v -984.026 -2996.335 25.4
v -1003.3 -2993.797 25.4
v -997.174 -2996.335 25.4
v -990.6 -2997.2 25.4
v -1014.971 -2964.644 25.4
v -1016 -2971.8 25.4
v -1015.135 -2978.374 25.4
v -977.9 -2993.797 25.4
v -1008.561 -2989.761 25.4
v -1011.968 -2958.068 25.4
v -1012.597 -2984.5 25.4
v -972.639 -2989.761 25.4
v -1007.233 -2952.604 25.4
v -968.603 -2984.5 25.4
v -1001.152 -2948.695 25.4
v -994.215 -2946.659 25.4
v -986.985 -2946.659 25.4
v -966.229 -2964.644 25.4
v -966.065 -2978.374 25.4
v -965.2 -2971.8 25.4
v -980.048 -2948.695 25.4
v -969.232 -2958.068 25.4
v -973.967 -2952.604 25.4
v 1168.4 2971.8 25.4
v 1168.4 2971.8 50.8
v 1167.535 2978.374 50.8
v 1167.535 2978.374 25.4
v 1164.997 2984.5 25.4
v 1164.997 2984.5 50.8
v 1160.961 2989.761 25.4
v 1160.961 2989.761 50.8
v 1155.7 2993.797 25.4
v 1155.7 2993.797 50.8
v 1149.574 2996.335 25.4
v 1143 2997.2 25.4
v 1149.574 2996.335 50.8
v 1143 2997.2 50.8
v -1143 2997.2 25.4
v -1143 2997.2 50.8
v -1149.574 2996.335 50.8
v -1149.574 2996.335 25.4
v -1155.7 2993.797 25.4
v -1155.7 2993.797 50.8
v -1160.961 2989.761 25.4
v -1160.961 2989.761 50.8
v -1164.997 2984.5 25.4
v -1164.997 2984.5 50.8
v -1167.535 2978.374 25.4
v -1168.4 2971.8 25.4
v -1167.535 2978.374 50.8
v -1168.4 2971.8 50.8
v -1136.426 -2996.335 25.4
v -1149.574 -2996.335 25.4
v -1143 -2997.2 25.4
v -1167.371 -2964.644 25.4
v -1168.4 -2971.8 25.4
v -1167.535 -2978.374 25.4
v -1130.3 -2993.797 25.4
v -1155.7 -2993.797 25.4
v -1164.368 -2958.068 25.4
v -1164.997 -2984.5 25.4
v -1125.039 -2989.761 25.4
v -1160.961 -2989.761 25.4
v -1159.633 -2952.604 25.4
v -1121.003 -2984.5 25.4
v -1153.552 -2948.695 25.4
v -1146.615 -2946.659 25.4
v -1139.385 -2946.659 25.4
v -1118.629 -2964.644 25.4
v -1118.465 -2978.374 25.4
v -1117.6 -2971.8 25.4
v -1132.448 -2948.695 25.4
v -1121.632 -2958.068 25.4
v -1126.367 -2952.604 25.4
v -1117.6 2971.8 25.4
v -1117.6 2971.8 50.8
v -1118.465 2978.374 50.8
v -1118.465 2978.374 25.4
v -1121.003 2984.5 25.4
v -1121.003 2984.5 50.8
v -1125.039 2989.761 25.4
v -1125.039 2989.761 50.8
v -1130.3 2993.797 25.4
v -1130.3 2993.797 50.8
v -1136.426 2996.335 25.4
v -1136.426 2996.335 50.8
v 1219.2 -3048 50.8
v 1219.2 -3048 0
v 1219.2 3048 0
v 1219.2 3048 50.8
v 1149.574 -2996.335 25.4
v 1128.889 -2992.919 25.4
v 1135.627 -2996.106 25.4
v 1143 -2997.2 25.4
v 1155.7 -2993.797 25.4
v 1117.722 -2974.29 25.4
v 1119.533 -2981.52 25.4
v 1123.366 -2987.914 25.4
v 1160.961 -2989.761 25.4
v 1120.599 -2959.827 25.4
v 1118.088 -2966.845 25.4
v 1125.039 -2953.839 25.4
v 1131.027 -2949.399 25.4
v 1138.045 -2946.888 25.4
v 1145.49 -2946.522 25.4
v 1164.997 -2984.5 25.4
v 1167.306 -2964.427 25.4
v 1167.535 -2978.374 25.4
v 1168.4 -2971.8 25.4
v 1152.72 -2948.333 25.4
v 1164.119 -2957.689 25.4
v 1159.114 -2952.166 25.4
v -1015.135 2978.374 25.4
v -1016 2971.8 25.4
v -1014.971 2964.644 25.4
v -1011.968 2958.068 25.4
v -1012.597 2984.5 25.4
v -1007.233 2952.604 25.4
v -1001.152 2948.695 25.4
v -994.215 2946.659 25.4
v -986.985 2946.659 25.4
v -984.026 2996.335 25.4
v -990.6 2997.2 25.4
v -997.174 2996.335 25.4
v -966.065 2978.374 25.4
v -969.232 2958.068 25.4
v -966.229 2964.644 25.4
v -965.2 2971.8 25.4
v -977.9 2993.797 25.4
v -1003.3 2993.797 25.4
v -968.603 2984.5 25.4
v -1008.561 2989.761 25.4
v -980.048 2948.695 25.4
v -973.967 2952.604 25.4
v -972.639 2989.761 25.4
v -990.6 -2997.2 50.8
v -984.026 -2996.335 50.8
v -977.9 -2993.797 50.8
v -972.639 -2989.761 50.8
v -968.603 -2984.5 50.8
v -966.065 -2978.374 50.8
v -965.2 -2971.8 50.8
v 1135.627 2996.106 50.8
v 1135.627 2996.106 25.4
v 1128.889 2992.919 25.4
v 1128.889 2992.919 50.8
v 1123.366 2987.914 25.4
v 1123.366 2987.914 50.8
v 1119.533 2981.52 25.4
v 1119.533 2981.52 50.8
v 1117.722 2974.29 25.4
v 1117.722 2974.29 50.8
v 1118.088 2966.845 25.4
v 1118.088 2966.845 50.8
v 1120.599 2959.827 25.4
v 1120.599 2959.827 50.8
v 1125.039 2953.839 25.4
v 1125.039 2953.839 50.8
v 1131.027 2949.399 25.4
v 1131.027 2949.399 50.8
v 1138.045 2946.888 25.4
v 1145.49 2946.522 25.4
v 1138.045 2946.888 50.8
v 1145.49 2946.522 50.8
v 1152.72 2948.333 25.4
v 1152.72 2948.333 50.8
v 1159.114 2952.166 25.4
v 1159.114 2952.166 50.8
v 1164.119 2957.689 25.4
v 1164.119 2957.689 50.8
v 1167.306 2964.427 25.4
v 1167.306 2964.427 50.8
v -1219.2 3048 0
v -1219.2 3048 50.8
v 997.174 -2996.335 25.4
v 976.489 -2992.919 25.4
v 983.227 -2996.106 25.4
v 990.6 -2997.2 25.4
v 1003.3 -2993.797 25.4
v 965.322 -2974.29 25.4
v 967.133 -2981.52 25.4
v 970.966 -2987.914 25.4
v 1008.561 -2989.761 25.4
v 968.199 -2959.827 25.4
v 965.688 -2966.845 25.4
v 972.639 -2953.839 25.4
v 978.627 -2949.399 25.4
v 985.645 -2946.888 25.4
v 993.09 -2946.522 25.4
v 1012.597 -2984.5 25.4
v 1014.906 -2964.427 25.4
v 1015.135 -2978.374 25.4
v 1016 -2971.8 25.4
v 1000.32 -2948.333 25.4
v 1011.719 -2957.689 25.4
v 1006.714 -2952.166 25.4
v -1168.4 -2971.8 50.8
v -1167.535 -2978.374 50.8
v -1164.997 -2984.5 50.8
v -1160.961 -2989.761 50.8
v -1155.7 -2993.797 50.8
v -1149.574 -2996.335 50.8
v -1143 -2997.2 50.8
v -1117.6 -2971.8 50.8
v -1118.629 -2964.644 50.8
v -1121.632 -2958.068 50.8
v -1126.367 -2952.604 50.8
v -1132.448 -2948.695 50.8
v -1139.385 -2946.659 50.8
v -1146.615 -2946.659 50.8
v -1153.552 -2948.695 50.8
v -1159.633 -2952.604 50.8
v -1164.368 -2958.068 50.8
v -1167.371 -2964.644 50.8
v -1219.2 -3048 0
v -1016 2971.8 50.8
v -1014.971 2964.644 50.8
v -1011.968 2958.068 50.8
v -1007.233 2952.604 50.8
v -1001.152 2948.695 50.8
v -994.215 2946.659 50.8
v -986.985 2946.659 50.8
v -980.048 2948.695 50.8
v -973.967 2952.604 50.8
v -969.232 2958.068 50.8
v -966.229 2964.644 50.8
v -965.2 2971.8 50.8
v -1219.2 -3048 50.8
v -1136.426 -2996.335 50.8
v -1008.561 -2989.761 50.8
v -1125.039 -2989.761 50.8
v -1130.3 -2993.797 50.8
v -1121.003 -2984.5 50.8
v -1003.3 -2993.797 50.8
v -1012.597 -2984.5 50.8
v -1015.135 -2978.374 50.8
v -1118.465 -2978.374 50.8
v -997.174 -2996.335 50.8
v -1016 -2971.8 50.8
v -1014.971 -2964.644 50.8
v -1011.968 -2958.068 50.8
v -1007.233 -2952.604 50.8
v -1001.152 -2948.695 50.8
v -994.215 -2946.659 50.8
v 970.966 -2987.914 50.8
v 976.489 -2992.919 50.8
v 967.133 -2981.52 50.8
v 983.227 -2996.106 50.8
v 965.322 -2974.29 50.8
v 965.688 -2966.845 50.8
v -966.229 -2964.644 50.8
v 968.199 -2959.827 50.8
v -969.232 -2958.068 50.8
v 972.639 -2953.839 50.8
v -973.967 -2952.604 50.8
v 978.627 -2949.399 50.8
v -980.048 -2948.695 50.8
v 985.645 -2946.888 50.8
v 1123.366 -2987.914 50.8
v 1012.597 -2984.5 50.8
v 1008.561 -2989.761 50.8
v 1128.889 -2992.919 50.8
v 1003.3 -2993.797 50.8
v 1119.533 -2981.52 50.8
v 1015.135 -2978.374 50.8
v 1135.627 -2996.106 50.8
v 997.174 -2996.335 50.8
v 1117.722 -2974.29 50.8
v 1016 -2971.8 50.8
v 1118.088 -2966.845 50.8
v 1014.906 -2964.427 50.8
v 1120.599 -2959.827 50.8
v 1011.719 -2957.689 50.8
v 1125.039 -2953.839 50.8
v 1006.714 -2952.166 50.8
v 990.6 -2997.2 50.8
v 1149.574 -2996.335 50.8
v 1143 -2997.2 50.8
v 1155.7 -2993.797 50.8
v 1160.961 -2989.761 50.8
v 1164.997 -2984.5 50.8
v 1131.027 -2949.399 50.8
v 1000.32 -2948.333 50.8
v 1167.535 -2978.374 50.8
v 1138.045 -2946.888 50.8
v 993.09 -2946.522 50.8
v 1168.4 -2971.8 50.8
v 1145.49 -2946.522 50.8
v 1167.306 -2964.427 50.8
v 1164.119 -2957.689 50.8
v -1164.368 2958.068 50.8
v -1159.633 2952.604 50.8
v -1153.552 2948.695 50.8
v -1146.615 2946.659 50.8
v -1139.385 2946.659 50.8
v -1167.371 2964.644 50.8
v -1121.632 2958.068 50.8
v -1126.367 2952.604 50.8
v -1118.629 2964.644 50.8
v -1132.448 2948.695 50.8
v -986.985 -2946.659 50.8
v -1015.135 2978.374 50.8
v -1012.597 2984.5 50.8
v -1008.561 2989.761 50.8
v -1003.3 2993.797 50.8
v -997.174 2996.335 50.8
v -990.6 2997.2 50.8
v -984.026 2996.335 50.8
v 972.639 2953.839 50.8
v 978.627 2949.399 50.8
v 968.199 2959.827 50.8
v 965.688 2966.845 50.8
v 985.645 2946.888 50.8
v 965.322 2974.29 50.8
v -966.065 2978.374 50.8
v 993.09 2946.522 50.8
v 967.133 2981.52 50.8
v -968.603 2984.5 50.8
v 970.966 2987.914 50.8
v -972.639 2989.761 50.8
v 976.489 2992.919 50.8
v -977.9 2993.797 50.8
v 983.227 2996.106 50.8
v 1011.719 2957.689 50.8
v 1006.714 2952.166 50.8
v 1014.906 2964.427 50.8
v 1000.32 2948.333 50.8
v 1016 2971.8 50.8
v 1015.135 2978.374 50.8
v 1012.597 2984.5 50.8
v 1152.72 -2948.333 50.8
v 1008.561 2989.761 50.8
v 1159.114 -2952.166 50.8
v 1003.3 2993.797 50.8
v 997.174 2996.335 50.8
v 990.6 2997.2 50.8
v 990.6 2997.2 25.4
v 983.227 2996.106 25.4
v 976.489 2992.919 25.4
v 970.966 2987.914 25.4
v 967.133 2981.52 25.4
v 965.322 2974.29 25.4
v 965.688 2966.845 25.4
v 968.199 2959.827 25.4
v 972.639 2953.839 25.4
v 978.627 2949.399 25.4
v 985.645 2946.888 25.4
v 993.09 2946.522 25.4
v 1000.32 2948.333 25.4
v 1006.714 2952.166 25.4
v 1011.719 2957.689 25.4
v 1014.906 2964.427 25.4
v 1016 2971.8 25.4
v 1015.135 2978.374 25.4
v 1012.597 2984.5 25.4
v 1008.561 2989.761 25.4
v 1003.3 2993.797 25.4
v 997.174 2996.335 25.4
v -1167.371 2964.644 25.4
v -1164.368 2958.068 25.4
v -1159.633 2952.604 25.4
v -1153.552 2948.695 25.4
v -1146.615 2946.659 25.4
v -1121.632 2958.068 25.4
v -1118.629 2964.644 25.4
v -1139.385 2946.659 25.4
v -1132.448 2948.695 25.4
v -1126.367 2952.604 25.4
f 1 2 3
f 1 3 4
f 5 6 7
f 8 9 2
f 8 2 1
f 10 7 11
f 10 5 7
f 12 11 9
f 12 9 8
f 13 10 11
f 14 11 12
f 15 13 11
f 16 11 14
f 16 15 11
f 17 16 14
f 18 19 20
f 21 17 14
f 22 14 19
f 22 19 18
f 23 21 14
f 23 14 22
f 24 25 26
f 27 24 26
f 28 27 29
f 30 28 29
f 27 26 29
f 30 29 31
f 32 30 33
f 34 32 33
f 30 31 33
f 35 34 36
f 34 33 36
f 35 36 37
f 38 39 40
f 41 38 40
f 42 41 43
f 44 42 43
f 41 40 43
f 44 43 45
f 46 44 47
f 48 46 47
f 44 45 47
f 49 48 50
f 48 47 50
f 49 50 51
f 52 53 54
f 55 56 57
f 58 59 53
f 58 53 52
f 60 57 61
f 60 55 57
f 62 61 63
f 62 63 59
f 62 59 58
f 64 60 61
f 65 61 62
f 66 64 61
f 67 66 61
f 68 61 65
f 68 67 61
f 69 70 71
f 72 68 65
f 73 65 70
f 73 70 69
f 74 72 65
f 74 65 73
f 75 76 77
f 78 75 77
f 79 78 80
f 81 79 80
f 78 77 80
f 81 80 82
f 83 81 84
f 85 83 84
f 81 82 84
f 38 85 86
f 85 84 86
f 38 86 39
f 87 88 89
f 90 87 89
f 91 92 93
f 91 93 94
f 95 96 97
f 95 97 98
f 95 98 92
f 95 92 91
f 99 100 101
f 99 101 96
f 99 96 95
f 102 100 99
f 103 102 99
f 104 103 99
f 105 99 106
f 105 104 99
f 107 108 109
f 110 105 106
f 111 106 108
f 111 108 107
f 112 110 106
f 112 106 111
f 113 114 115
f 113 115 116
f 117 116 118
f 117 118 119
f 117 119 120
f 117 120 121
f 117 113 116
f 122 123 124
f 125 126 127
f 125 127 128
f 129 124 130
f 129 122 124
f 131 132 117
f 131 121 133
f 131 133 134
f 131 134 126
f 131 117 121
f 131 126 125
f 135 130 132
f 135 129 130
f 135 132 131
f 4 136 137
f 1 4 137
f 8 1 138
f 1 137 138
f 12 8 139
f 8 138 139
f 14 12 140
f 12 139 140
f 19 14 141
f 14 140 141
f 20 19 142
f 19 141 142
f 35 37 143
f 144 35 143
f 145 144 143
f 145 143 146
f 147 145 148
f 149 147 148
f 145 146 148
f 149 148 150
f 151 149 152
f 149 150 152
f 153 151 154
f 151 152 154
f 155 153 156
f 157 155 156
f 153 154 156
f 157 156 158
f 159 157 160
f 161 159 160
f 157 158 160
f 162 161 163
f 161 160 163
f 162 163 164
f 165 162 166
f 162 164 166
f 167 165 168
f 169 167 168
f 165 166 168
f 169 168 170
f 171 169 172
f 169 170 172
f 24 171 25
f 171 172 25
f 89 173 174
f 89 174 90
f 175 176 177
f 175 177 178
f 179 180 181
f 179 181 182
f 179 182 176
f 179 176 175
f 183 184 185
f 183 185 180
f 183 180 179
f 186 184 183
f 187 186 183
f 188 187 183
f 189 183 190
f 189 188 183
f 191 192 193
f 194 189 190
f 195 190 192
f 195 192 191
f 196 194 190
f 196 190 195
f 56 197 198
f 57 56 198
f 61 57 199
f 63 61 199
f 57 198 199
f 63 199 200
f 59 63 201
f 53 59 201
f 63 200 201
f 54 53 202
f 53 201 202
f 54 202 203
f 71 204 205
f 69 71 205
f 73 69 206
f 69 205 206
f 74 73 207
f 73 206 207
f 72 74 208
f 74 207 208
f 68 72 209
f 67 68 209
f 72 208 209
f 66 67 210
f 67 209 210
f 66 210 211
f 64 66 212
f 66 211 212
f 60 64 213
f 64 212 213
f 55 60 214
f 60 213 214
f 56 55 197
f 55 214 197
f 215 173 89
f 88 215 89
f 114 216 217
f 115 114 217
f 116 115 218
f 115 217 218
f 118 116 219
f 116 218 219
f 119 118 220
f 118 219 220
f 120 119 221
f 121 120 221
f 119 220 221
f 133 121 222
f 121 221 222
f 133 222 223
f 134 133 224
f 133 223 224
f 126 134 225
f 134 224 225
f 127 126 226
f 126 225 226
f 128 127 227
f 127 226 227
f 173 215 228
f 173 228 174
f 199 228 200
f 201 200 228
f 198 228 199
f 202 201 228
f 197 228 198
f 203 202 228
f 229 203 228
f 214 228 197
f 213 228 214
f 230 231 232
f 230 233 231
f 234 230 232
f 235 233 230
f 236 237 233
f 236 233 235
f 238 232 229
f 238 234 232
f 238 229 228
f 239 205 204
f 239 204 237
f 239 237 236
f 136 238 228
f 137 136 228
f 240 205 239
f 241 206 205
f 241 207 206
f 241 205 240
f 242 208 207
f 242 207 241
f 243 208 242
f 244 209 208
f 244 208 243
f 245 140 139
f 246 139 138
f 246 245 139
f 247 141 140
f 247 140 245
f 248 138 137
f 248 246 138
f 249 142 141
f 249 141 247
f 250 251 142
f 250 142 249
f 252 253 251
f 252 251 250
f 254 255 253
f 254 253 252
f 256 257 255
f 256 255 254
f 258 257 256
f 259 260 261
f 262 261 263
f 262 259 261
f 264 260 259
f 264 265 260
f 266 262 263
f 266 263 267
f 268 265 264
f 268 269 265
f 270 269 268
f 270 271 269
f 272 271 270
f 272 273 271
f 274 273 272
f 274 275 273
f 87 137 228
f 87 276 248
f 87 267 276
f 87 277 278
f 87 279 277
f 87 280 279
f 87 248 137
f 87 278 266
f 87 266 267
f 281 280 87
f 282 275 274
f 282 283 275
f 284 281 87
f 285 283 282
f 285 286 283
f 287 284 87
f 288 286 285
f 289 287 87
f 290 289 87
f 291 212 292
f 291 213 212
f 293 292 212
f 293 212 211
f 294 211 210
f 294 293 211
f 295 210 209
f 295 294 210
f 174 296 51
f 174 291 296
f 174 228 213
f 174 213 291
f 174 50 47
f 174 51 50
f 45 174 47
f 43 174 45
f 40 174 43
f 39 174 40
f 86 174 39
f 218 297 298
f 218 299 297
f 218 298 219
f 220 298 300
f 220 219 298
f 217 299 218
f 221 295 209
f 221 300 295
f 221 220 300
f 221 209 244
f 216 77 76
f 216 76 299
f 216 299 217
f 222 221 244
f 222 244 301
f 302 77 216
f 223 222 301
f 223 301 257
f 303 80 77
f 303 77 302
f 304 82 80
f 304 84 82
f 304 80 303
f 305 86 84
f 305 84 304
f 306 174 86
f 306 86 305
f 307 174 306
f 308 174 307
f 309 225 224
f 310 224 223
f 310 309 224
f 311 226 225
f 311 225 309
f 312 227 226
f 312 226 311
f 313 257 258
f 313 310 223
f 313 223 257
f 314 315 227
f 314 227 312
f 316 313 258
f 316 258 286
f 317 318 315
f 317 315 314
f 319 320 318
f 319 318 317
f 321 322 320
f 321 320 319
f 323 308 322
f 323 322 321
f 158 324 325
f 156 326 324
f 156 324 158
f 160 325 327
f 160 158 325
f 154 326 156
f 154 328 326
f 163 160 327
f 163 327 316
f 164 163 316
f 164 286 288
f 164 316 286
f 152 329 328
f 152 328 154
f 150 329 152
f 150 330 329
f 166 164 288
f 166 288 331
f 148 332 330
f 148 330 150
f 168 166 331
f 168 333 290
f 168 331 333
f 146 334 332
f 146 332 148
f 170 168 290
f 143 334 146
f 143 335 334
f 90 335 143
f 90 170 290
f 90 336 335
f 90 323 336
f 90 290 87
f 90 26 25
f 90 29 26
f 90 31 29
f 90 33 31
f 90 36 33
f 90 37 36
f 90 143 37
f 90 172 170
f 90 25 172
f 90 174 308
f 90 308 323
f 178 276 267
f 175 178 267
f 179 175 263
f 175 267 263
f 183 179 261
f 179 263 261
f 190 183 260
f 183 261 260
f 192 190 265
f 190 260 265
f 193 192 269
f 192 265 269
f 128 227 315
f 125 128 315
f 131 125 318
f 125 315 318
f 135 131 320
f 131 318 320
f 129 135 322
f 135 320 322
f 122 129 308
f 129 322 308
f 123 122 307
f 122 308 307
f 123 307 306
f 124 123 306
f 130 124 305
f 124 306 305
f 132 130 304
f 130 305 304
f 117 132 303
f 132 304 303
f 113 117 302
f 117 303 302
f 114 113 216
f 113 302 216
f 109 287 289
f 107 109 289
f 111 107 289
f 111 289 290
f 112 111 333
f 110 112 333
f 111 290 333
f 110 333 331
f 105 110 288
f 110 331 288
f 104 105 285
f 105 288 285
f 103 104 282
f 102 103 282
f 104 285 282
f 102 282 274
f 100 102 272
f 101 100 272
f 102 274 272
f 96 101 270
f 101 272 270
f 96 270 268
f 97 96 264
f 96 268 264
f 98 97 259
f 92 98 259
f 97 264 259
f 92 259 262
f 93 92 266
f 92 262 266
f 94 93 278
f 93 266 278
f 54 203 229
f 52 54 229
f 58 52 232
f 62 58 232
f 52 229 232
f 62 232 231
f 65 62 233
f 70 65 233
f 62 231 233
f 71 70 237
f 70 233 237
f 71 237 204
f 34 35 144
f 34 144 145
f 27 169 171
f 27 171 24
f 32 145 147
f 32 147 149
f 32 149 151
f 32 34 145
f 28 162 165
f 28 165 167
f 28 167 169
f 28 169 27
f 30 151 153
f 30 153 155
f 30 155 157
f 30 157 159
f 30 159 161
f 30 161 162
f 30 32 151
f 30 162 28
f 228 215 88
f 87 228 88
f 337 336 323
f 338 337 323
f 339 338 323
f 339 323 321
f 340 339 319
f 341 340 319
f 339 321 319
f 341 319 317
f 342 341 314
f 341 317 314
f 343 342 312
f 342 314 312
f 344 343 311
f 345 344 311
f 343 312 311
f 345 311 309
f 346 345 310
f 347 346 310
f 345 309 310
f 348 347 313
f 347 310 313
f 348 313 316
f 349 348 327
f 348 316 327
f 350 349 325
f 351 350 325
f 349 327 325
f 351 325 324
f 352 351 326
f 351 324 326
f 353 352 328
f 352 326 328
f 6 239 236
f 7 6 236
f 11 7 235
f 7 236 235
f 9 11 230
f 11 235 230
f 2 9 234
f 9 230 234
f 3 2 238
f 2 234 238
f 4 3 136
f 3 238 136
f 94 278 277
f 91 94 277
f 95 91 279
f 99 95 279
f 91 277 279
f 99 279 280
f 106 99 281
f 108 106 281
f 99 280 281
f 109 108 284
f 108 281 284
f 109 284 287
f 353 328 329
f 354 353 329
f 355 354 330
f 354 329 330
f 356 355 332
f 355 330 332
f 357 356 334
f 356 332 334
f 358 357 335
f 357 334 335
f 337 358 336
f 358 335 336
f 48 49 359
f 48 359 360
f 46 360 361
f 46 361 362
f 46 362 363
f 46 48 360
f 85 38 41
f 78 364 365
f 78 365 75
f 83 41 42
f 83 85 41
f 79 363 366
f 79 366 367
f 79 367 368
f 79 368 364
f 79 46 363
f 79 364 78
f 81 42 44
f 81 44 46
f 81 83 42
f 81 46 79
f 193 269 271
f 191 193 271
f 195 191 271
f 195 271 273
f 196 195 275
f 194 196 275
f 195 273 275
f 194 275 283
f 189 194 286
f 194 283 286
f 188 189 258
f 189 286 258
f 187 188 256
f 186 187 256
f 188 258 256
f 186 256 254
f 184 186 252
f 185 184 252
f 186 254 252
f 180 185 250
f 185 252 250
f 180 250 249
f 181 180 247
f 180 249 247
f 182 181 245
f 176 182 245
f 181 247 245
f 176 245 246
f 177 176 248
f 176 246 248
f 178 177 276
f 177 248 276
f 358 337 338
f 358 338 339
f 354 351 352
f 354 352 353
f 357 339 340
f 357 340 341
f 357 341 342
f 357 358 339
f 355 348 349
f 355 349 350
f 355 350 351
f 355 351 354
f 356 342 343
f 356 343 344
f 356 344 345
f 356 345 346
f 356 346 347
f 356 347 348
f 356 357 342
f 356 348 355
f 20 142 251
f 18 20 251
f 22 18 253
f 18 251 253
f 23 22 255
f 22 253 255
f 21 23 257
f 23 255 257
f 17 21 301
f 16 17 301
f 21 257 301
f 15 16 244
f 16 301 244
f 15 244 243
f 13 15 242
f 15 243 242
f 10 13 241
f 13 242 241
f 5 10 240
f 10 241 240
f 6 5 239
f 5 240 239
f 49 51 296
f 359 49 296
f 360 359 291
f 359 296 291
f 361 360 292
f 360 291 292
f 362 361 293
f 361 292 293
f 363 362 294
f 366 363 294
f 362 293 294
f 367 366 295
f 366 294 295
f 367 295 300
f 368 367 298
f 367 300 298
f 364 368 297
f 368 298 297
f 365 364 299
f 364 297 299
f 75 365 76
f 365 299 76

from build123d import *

# Parameters (mm, degrees)
F0_W     = 2438.4
F0_H     = 6096
F1_DEPTH = 50.8
F3_DEPTH = 25.4
F5_DEPTH = 25.4


with BuildPart() as f1:
    # F0 (on Top) → F1 (new body)
    with BuildSketch(Plane.XY):
        Rectangle(F0_W, F0_H)
    extrude(amount=F1_DEPTH)

    # F2 (on face) → F3 (cut)
    with BuildSketch(Plane.XY.offset(50.8)):
        with BuildLine():
            Line((1143, 2971.8), (1168.4, 2971.8))
            ThreePointArc((1168.4, 2971.8), (1160.960512, 2989.760512), (1143, 2997.2))
            Line((1143, 2997.2), (1143, 2971.8))
        make_face()
        with BuildLine():
            ThreePointArc((1143, 2997.2), (1125.039488, 2953.839488), (1168.4, 2971.8))
            Line((1168.4, 2971.8), (1143, 2971.8))
            Line((1143, 2971.8), (1143, 2997.2))
        make_face()
        with BuildLine():
            Line((1143, -2971.8), (1143, -2997.2))
            ThreePointArc((1143, -2997.2), (1160.960512, -2989.760512), (1168.4, -2971.8))
            Line((1168.4, -2971.8), (1143, -2971.8))
        make_face()
        with BuildLine():
            ThreePointArc((1168.4, -2971.8), (1125.039488, -2953.839488), (1143, -2997.2))
            Line((1143, -2997.2), (1143, -2971.8))
            Line((1143, -2971.8), (1168.4, -2971.8))
        make_face()
        with BuildLine():
            ThreePointArc((-1168.4, -2971.8), (-1160.960512, -2989.760512), (-1143, -2997.2))
            Line((-1143, -2997.2), (-1143, -2971.8))
            Line((-1143, -2971.8), (-1168.4, -2971.8))
        make_face()
        with BuildLine():
            Line((-1143, -2971.8), (-1143, -2997.2))
            ThreePointArc((-1143, -2997.2), (-1125.039488, -2989.760512), (-1117.6, -2971.8))
            ThreePointArc((-1117.6, -2971.8), (-1143, -2946.4), (-1168.4, -2971.8))
            Line((-1168.4, -2971.8), (-1143, -2971.8))
        make_face()
        with BuildLine():
            ThreePointArc((-1143, 2997.2), (-1160.960512, 2989.760512), (-1168.4, 2971.8))
            Line((-1168.4, 2971.8), (-1143, 2971.8))
            Line((-1143, 2971.8), (-1143, 2997.2))
        make_face()
        with BuildLine():
            Line((-1143, 2971.8), (-1168.4, 2971.8))
            ThreePointArc((-1168.4, 2971.8), (-1143, 2946.4), (-1117.6, 2971.8))
            ThreePointArc((-1117.6, 2971.8), (-1125.039488, 2989.760512), (-1143, 2997.2))
            Line((-1143, 2997.2), (-1143, 2971.8))
        make_face()
    extrude(amount=-F3_DEPTH, mode=Mode.SUBTRACT)

    # F4 (on face) → F5 (cut)
    with BuildSketch(Plane.XY.offset(50.8)):
        with BuildLine():
            ThreePointArc((1016, -2971.8), (972.639488, -2953.839488), (990.6, -2997.2))
            Line((990.6, -2997.2), (990.6, -2971.8))
            Line((990.6, -2971.8), (1016, -2971.8))
        make_face()
        with BuildLine():
            Line((990.6, -2971.8), (990.6, -2997.2))
            ThreePointArc((990.6, -2997.2), (1008.560512, -2989.760512), (1016, -2971.8))
            Line((1016, -2971.8), (990.6, -2971.8))
        make_face()
        with BuildLine():
            Line((-990.6, -2971.8), (-1016, -2971.8))
            ThreePointArc((-1016, -2971.8), (-1008.560512, -2989.760512), (-990.6, -2997.2))
            Line((-990.6, -2997.2), (-990.6, -2971.8))
        make_face()
        with BuildLine():
            ThreePointArc((-965.2, -2971.8), (-990.6, -2946.4), (-1016, -2971.8))
            Line((-1016, -2971.8), (-990.6, -2971.8))
            Line((-990.6, -2971.8), (-990.6, -2997.2))
            ThreePointArc((-990.6, -2997.2), (-972.639488, -2989.760512), (-965.2, -2971.8))
        make_face()
        with BuildLine():
            ThreePointArc((1016, 2971.8), (1008.560512, 2989.760512), (990.6, 2997.2))
            Line((990.6, 2997.2), (990.6, 2971.8))
            Line((990.6, 2971.8), (1016, 2971.8))
        make_face()
        with BuildLine():
            Line((990.6, 2971.8), (990.6, 2997.2))
            ThreePointArc((990.6, 2997.2), (972.639488, 2953.839488), (1016, 2971.8))
            Line((1016, 2971.8), (990.6, 2971.8))
        make_face()
        with BuildLine():
            Line((-990.6, 2971.8), (-990.6, 2997.2))
            ThreePointArc((-990.6, 2997.2), (-1008.560512, 2989.760512), (-1016, 2971.8))
            Line((-1016, 2971.8), (-990.6, 2971.8))
        make_face()
        with BuildLine():
            ThreePointArc((-965.2, 2971.8), (-972.639488, 2989.760512), (-990.6, 2997.2))
            Line((-990.6, 2997.2), (-990.6, 2971.8))
            Line((-990.6, 2971.8), (-1016, 2971.8))
            ThreePointArc((-1016, 2971.8), (-990.6, 2946.4), (-965.2, 2971.8))
        make_face()
    extrude(amount=-F5_DEPTH, mode=Mode.SUBTRACT)


solid = f1.part
